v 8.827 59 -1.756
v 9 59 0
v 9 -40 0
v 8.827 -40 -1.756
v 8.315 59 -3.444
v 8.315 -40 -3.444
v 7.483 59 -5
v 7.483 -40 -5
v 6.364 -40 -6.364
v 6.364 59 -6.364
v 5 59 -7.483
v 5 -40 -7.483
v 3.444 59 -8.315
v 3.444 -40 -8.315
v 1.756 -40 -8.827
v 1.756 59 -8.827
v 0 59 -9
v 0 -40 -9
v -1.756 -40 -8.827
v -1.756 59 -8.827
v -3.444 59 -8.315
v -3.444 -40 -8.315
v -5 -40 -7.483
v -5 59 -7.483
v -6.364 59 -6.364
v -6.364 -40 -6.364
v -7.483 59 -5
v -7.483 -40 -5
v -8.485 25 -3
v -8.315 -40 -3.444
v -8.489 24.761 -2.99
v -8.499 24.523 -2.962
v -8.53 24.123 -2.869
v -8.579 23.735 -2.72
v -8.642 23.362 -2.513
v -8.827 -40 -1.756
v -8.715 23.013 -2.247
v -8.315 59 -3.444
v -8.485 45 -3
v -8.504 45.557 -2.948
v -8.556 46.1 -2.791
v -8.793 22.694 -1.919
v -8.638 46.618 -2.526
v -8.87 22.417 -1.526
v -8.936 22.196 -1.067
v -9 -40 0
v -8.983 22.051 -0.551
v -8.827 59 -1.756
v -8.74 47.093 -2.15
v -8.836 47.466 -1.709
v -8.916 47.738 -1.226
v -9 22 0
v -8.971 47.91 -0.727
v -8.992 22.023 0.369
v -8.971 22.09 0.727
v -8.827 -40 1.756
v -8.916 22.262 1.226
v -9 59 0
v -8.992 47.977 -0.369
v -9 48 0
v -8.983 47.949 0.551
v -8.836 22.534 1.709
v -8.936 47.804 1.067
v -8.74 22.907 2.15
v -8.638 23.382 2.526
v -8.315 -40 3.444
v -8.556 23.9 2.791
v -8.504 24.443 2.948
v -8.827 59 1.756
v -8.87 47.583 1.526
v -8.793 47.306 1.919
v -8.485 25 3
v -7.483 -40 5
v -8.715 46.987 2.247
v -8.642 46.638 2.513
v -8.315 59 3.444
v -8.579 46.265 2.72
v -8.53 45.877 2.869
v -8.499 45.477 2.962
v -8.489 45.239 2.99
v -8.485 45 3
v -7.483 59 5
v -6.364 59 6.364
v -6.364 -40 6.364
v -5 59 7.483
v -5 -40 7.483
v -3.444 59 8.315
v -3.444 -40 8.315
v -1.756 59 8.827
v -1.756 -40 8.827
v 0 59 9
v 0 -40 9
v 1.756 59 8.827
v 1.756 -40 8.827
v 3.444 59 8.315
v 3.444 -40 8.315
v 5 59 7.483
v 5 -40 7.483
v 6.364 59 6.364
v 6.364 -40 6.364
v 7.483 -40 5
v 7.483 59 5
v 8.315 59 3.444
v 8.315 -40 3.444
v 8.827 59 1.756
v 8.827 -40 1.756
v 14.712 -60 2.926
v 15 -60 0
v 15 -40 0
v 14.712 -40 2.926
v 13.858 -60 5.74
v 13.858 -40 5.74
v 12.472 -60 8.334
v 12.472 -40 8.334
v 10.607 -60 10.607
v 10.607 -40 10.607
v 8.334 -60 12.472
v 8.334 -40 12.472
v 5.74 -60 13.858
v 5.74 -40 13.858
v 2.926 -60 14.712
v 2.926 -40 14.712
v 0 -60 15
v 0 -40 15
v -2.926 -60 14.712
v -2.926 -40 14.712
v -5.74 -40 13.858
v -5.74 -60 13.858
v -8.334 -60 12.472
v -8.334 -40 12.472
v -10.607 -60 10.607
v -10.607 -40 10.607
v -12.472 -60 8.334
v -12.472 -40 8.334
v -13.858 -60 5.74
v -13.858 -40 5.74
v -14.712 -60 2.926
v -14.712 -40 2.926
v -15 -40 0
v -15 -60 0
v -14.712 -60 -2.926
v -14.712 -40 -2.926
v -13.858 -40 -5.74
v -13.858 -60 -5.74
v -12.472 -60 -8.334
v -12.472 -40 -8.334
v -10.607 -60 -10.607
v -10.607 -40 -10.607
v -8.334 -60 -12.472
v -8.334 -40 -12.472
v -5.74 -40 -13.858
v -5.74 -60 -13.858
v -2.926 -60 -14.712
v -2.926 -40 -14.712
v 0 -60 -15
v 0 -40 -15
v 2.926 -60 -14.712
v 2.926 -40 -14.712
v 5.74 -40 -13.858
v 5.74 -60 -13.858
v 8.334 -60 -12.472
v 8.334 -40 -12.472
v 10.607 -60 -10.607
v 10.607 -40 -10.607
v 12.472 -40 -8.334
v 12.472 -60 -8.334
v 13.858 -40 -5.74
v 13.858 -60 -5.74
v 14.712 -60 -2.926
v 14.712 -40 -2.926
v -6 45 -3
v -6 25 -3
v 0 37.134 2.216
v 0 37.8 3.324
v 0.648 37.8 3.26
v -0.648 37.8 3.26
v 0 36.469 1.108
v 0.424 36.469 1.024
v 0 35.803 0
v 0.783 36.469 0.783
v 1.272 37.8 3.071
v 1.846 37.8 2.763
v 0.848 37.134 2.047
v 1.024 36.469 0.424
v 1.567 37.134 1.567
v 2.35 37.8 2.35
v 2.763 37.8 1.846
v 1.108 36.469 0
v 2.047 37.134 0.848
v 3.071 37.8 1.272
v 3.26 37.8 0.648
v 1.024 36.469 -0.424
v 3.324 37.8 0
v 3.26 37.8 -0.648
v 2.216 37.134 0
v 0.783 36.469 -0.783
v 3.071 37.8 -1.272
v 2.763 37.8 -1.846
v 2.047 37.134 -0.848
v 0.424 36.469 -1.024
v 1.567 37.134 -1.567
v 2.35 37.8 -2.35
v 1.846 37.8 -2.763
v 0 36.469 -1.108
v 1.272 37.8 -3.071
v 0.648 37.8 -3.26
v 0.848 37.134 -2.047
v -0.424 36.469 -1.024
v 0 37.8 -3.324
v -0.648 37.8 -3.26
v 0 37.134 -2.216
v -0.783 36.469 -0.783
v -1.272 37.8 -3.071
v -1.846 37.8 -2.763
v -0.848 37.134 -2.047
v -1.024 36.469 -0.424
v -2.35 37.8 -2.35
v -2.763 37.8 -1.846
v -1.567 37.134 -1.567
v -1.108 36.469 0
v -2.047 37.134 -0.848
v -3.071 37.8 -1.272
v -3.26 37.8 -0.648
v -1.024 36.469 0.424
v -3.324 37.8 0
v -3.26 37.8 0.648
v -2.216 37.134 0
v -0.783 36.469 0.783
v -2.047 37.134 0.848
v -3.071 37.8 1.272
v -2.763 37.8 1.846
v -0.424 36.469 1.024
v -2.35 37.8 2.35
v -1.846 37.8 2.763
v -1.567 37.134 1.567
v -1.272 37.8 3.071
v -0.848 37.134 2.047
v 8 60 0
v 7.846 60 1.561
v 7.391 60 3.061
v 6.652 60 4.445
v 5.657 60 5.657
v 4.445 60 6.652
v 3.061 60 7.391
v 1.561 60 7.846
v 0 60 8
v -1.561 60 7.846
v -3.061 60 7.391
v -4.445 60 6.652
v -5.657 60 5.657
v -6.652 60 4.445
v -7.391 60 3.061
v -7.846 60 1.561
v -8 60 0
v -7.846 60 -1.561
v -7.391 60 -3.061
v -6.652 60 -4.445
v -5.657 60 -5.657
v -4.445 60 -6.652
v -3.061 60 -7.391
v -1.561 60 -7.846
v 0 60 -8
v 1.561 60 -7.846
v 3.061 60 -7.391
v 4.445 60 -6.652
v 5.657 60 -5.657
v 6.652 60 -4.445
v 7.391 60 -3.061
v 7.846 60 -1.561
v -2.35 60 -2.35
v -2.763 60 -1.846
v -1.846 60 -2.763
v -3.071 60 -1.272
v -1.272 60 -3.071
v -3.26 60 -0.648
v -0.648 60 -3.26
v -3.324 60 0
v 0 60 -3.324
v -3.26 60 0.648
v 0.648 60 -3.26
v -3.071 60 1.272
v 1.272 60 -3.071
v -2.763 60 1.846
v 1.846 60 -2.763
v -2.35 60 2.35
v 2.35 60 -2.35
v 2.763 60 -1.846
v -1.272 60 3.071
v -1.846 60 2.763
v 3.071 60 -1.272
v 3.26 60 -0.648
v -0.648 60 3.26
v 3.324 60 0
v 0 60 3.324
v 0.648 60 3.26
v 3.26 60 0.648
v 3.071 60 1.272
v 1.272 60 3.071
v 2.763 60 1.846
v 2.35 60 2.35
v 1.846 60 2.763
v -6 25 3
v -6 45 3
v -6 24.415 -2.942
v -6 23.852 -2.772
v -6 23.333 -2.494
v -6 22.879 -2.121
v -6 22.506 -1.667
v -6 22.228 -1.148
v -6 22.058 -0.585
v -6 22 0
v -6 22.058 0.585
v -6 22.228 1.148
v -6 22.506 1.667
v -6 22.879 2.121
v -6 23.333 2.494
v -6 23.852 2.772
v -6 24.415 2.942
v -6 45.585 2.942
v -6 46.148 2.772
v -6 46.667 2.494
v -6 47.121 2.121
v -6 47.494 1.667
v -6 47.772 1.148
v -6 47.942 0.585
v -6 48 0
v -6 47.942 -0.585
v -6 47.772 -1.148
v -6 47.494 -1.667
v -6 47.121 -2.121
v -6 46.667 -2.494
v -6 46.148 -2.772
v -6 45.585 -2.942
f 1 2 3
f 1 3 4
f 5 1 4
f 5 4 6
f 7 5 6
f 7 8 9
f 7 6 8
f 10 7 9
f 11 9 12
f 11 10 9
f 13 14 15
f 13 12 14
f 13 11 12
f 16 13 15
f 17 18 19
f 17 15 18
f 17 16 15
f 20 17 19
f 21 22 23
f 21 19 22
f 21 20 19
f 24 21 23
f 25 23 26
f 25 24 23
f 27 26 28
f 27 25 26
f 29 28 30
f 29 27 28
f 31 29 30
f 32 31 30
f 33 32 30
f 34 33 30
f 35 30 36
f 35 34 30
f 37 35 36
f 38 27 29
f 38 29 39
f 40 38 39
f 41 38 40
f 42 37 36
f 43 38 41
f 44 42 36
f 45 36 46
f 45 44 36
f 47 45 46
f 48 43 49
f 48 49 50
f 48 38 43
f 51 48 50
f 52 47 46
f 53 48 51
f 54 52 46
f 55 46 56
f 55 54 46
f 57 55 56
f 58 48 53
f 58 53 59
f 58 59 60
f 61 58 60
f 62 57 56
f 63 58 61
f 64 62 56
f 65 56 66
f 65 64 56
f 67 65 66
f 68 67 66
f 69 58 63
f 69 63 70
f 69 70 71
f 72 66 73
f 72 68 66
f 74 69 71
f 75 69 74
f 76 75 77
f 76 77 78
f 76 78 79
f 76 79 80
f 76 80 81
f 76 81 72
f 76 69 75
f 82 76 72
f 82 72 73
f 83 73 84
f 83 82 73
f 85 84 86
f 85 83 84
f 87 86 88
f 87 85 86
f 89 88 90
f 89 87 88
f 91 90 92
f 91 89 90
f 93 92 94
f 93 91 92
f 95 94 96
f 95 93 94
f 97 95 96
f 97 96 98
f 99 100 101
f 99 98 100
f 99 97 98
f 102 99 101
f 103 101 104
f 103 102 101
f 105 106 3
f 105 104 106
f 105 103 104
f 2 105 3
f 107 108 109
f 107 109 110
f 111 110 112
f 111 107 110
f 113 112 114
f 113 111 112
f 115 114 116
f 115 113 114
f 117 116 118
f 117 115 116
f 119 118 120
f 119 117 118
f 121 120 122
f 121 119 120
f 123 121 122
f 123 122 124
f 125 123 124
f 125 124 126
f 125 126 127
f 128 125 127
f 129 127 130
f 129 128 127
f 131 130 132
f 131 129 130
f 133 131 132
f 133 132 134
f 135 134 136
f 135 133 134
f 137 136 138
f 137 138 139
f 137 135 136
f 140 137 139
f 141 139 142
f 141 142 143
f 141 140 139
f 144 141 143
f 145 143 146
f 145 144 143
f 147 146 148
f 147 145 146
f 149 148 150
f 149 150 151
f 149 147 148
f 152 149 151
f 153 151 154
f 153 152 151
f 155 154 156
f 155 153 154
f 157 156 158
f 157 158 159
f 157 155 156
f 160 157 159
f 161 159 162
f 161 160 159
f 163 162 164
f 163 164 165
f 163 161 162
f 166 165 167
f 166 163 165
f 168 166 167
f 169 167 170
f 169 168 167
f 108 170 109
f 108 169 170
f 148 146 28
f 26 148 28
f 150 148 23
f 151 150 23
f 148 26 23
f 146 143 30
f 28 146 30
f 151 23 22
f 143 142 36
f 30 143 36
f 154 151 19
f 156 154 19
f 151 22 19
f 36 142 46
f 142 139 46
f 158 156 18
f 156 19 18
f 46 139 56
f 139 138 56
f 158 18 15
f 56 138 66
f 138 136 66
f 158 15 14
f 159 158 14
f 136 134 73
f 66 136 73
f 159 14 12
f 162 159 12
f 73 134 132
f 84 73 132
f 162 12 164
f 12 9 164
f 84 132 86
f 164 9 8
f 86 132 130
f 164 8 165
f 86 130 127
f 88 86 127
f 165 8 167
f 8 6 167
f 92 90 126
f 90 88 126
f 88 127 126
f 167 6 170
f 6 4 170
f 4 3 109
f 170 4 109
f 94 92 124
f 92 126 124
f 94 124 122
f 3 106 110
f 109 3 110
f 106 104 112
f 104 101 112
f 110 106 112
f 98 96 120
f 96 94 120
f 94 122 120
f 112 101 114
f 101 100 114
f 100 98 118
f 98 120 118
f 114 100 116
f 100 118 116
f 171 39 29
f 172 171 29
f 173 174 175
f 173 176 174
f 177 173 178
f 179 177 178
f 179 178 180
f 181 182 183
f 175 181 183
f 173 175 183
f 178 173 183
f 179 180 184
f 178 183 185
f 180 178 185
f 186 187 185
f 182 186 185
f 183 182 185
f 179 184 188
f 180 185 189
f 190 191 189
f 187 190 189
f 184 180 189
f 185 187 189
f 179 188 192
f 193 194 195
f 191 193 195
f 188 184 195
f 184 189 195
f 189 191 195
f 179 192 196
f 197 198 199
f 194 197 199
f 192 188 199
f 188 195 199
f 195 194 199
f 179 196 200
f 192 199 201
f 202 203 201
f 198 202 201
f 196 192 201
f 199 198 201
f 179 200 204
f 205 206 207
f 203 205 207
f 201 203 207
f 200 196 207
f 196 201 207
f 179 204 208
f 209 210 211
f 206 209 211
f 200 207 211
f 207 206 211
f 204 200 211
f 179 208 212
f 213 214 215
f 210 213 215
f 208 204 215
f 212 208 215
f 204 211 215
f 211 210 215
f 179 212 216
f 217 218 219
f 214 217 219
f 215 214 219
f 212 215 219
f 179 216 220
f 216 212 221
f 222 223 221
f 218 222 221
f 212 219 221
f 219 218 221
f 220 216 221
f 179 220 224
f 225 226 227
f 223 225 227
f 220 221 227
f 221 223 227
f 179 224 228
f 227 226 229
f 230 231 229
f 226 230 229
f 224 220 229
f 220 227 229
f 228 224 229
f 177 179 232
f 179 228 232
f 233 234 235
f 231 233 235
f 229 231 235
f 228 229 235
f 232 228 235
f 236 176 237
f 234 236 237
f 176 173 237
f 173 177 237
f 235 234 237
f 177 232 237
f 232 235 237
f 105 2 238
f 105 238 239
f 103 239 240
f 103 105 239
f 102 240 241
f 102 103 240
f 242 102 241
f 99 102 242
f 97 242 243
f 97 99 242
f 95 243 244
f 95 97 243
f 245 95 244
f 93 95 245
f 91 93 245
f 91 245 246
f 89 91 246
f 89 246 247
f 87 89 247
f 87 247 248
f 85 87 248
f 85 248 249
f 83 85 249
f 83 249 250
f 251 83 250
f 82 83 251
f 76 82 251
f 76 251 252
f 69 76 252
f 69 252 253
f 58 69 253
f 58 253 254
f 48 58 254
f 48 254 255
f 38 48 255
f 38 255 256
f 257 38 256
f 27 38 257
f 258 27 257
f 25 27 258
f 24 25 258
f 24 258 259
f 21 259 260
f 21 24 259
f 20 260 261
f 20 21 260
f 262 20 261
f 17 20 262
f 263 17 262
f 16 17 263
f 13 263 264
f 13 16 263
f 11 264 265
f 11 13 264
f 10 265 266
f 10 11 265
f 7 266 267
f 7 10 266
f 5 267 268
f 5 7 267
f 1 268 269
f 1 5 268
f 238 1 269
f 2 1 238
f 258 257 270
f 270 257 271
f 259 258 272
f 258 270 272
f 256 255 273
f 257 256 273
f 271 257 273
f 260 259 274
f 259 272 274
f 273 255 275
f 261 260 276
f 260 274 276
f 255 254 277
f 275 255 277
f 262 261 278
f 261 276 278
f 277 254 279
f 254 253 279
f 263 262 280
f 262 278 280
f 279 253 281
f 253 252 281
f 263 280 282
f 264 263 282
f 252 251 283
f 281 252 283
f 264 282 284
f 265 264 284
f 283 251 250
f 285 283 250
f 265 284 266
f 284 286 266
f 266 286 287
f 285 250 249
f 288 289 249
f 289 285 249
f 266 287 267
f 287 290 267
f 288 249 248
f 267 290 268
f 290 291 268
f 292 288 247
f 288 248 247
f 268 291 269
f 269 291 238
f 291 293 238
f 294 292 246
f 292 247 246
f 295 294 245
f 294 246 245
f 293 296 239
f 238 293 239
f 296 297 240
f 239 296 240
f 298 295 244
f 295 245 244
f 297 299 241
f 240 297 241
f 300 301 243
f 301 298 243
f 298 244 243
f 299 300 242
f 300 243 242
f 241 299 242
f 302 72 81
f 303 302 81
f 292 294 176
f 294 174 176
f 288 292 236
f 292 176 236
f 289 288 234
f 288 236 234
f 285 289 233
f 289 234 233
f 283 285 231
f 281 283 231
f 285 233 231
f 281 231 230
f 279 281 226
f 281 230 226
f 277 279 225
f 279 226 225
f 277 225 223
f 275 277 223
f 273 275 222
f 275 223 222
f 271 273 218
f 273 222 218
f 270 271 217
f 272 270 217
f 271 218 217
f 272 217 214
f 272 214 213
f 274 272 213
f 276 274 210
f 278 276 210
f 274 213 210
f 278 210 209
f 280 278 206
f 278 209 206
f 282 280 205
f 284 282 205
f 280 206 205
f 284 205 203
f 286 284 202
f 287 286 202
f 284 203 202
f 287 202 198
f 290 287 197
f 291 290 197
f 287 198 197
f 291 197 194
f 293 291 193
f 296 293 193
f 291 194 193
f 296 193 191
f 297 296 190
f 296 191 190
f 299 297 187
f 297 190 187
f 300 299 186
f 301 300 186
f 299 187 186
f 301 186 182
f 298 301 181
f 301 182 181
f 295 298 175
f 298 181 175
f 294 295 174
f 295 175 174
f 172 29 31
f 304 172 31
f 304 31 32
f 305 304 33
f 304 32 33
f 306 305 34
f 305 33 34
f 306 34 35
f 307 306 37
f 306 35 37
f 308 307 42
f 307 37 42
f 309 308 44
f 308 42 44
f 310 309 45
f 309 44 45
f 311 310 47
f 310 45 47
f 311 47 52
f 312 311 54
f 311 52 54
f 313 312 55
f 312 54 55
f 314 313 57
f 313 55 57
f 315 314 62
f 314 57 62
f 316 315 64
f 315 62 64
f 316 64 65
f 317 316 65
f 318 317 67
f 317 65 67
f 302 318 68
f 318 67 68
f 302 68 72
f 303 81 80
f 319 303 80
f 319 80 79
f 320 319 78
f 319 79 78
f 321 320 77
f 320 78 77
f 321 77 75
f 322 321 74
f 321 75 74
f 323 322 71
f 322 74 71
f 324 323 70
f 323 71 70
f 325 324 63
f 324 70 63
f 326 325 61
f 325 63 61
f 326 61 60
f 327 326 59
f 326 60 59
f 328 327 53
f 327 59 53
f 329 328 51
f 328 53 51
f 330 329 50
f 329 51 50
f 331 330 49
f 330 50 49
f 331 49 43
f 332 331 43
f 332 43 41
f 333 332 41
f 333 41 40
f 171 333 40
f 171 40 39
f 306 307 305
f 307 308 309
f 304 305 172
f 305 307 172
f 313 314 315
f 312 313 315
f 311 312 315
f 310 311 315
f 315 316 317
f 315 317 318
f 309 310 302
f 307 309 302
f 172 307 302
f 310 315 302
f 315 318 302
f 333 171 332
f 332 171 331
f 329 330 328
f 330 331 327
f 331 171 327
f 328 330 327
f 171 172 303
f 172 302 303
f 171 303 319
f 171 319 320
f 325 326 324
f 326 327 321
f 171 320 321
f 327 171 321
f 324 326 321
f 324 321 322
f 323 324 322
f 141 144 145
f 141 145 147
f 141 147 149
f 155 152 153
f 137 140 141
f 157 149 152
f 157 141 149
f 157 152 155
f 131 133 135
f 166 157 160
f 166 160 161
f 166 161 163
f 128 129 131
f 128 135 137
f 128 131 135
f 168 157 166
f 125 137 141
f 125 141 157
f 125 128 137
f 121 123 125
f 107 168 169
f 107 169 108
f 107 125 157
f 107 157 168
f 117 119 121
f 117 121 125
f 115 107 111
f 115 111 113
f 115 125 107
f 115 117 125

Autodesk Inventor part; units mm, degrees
ref_plane "XZ Plane" through (0, 0, 0) normal (0, 1, 0) x (-1, 0, 0)
ref_plane "XY Plane" through (0, 0, 0) normal (0, 0, 1) x (1, 0, 0)
sketch "Sketch1" plane through (0, 0, 0) normal (0, 0, 1) x (1, 0, 0)
  line L0 (0, 60) -> (0, -60)
  line L1 (0, -60) -> (15, -60)
  line L2 (9, 60) -> (0, 60)
  line L3 (9, -40) -> (15, -40)
  line L4 (9, -40) -> (9, 60)
  line L5 (15, -40) -> (15, -60)
  point P0 (0, 0)
  point P1 (0, 0)
  dimension "d17" = 18
  dimension "d18" = 20
  dimension "d19" = 30
  dimension "d42" = 100
revolve "Revolution1" add sketch "Sketch1" angle 360 about axis through (0, 60, 0) along (0, -1, 0)
sketch "Sketch4" plane through (0, 60, 0) normal (0, 1, 0) x (1, 0, 0)
  point P0 (0, 0)
  point P1 (0, 0)
hole "Hole1" at (0, 60, 0) direction (0, -1, 0) diameter 6.647 depth 22.2 tip angle 118 thread size "M8x1.25" class "6H" standard "ISO Metric profile"
chamfer "Chamfer1" distance 1 angle 45 1 edges at (-9, 60, 0)
ref_plane "Work Plane1" through (-9, 10, 0) normal (1, 0, 0) x (0, 1, 0)
sketch "Sketch5" plane through (-9, 10, 0) normal (1, 0, 0) x (0, 1, 0)
  line L0 (-50, 9) -> (-50, -9) projected
  line L1 (49, -9) -> (49, 9) projected
  line L2 (35, 0) -> (15, 0) construction
  line L3 (35, -3) -> (15, -3)
  line L4 (15, 3) -> (35, 3)
  arc A0 (35, -3) -> (35, 3) centre (35, 0) ccw
  arc A1 (15, 3) -> (15, -3) centre (15, 0) ccw
  line L5 (50, 8) -> (50, -8) projected
  point P0 (-10, 0)
  point P1 (25, 0)
  dimension "d36" = 6
  dimension "d37" = 20
  dimension "d39" = 15
extrude "Extrusion3" cut sketch "Sketch5" along normal blind 3
properties part number "приводной вал"
